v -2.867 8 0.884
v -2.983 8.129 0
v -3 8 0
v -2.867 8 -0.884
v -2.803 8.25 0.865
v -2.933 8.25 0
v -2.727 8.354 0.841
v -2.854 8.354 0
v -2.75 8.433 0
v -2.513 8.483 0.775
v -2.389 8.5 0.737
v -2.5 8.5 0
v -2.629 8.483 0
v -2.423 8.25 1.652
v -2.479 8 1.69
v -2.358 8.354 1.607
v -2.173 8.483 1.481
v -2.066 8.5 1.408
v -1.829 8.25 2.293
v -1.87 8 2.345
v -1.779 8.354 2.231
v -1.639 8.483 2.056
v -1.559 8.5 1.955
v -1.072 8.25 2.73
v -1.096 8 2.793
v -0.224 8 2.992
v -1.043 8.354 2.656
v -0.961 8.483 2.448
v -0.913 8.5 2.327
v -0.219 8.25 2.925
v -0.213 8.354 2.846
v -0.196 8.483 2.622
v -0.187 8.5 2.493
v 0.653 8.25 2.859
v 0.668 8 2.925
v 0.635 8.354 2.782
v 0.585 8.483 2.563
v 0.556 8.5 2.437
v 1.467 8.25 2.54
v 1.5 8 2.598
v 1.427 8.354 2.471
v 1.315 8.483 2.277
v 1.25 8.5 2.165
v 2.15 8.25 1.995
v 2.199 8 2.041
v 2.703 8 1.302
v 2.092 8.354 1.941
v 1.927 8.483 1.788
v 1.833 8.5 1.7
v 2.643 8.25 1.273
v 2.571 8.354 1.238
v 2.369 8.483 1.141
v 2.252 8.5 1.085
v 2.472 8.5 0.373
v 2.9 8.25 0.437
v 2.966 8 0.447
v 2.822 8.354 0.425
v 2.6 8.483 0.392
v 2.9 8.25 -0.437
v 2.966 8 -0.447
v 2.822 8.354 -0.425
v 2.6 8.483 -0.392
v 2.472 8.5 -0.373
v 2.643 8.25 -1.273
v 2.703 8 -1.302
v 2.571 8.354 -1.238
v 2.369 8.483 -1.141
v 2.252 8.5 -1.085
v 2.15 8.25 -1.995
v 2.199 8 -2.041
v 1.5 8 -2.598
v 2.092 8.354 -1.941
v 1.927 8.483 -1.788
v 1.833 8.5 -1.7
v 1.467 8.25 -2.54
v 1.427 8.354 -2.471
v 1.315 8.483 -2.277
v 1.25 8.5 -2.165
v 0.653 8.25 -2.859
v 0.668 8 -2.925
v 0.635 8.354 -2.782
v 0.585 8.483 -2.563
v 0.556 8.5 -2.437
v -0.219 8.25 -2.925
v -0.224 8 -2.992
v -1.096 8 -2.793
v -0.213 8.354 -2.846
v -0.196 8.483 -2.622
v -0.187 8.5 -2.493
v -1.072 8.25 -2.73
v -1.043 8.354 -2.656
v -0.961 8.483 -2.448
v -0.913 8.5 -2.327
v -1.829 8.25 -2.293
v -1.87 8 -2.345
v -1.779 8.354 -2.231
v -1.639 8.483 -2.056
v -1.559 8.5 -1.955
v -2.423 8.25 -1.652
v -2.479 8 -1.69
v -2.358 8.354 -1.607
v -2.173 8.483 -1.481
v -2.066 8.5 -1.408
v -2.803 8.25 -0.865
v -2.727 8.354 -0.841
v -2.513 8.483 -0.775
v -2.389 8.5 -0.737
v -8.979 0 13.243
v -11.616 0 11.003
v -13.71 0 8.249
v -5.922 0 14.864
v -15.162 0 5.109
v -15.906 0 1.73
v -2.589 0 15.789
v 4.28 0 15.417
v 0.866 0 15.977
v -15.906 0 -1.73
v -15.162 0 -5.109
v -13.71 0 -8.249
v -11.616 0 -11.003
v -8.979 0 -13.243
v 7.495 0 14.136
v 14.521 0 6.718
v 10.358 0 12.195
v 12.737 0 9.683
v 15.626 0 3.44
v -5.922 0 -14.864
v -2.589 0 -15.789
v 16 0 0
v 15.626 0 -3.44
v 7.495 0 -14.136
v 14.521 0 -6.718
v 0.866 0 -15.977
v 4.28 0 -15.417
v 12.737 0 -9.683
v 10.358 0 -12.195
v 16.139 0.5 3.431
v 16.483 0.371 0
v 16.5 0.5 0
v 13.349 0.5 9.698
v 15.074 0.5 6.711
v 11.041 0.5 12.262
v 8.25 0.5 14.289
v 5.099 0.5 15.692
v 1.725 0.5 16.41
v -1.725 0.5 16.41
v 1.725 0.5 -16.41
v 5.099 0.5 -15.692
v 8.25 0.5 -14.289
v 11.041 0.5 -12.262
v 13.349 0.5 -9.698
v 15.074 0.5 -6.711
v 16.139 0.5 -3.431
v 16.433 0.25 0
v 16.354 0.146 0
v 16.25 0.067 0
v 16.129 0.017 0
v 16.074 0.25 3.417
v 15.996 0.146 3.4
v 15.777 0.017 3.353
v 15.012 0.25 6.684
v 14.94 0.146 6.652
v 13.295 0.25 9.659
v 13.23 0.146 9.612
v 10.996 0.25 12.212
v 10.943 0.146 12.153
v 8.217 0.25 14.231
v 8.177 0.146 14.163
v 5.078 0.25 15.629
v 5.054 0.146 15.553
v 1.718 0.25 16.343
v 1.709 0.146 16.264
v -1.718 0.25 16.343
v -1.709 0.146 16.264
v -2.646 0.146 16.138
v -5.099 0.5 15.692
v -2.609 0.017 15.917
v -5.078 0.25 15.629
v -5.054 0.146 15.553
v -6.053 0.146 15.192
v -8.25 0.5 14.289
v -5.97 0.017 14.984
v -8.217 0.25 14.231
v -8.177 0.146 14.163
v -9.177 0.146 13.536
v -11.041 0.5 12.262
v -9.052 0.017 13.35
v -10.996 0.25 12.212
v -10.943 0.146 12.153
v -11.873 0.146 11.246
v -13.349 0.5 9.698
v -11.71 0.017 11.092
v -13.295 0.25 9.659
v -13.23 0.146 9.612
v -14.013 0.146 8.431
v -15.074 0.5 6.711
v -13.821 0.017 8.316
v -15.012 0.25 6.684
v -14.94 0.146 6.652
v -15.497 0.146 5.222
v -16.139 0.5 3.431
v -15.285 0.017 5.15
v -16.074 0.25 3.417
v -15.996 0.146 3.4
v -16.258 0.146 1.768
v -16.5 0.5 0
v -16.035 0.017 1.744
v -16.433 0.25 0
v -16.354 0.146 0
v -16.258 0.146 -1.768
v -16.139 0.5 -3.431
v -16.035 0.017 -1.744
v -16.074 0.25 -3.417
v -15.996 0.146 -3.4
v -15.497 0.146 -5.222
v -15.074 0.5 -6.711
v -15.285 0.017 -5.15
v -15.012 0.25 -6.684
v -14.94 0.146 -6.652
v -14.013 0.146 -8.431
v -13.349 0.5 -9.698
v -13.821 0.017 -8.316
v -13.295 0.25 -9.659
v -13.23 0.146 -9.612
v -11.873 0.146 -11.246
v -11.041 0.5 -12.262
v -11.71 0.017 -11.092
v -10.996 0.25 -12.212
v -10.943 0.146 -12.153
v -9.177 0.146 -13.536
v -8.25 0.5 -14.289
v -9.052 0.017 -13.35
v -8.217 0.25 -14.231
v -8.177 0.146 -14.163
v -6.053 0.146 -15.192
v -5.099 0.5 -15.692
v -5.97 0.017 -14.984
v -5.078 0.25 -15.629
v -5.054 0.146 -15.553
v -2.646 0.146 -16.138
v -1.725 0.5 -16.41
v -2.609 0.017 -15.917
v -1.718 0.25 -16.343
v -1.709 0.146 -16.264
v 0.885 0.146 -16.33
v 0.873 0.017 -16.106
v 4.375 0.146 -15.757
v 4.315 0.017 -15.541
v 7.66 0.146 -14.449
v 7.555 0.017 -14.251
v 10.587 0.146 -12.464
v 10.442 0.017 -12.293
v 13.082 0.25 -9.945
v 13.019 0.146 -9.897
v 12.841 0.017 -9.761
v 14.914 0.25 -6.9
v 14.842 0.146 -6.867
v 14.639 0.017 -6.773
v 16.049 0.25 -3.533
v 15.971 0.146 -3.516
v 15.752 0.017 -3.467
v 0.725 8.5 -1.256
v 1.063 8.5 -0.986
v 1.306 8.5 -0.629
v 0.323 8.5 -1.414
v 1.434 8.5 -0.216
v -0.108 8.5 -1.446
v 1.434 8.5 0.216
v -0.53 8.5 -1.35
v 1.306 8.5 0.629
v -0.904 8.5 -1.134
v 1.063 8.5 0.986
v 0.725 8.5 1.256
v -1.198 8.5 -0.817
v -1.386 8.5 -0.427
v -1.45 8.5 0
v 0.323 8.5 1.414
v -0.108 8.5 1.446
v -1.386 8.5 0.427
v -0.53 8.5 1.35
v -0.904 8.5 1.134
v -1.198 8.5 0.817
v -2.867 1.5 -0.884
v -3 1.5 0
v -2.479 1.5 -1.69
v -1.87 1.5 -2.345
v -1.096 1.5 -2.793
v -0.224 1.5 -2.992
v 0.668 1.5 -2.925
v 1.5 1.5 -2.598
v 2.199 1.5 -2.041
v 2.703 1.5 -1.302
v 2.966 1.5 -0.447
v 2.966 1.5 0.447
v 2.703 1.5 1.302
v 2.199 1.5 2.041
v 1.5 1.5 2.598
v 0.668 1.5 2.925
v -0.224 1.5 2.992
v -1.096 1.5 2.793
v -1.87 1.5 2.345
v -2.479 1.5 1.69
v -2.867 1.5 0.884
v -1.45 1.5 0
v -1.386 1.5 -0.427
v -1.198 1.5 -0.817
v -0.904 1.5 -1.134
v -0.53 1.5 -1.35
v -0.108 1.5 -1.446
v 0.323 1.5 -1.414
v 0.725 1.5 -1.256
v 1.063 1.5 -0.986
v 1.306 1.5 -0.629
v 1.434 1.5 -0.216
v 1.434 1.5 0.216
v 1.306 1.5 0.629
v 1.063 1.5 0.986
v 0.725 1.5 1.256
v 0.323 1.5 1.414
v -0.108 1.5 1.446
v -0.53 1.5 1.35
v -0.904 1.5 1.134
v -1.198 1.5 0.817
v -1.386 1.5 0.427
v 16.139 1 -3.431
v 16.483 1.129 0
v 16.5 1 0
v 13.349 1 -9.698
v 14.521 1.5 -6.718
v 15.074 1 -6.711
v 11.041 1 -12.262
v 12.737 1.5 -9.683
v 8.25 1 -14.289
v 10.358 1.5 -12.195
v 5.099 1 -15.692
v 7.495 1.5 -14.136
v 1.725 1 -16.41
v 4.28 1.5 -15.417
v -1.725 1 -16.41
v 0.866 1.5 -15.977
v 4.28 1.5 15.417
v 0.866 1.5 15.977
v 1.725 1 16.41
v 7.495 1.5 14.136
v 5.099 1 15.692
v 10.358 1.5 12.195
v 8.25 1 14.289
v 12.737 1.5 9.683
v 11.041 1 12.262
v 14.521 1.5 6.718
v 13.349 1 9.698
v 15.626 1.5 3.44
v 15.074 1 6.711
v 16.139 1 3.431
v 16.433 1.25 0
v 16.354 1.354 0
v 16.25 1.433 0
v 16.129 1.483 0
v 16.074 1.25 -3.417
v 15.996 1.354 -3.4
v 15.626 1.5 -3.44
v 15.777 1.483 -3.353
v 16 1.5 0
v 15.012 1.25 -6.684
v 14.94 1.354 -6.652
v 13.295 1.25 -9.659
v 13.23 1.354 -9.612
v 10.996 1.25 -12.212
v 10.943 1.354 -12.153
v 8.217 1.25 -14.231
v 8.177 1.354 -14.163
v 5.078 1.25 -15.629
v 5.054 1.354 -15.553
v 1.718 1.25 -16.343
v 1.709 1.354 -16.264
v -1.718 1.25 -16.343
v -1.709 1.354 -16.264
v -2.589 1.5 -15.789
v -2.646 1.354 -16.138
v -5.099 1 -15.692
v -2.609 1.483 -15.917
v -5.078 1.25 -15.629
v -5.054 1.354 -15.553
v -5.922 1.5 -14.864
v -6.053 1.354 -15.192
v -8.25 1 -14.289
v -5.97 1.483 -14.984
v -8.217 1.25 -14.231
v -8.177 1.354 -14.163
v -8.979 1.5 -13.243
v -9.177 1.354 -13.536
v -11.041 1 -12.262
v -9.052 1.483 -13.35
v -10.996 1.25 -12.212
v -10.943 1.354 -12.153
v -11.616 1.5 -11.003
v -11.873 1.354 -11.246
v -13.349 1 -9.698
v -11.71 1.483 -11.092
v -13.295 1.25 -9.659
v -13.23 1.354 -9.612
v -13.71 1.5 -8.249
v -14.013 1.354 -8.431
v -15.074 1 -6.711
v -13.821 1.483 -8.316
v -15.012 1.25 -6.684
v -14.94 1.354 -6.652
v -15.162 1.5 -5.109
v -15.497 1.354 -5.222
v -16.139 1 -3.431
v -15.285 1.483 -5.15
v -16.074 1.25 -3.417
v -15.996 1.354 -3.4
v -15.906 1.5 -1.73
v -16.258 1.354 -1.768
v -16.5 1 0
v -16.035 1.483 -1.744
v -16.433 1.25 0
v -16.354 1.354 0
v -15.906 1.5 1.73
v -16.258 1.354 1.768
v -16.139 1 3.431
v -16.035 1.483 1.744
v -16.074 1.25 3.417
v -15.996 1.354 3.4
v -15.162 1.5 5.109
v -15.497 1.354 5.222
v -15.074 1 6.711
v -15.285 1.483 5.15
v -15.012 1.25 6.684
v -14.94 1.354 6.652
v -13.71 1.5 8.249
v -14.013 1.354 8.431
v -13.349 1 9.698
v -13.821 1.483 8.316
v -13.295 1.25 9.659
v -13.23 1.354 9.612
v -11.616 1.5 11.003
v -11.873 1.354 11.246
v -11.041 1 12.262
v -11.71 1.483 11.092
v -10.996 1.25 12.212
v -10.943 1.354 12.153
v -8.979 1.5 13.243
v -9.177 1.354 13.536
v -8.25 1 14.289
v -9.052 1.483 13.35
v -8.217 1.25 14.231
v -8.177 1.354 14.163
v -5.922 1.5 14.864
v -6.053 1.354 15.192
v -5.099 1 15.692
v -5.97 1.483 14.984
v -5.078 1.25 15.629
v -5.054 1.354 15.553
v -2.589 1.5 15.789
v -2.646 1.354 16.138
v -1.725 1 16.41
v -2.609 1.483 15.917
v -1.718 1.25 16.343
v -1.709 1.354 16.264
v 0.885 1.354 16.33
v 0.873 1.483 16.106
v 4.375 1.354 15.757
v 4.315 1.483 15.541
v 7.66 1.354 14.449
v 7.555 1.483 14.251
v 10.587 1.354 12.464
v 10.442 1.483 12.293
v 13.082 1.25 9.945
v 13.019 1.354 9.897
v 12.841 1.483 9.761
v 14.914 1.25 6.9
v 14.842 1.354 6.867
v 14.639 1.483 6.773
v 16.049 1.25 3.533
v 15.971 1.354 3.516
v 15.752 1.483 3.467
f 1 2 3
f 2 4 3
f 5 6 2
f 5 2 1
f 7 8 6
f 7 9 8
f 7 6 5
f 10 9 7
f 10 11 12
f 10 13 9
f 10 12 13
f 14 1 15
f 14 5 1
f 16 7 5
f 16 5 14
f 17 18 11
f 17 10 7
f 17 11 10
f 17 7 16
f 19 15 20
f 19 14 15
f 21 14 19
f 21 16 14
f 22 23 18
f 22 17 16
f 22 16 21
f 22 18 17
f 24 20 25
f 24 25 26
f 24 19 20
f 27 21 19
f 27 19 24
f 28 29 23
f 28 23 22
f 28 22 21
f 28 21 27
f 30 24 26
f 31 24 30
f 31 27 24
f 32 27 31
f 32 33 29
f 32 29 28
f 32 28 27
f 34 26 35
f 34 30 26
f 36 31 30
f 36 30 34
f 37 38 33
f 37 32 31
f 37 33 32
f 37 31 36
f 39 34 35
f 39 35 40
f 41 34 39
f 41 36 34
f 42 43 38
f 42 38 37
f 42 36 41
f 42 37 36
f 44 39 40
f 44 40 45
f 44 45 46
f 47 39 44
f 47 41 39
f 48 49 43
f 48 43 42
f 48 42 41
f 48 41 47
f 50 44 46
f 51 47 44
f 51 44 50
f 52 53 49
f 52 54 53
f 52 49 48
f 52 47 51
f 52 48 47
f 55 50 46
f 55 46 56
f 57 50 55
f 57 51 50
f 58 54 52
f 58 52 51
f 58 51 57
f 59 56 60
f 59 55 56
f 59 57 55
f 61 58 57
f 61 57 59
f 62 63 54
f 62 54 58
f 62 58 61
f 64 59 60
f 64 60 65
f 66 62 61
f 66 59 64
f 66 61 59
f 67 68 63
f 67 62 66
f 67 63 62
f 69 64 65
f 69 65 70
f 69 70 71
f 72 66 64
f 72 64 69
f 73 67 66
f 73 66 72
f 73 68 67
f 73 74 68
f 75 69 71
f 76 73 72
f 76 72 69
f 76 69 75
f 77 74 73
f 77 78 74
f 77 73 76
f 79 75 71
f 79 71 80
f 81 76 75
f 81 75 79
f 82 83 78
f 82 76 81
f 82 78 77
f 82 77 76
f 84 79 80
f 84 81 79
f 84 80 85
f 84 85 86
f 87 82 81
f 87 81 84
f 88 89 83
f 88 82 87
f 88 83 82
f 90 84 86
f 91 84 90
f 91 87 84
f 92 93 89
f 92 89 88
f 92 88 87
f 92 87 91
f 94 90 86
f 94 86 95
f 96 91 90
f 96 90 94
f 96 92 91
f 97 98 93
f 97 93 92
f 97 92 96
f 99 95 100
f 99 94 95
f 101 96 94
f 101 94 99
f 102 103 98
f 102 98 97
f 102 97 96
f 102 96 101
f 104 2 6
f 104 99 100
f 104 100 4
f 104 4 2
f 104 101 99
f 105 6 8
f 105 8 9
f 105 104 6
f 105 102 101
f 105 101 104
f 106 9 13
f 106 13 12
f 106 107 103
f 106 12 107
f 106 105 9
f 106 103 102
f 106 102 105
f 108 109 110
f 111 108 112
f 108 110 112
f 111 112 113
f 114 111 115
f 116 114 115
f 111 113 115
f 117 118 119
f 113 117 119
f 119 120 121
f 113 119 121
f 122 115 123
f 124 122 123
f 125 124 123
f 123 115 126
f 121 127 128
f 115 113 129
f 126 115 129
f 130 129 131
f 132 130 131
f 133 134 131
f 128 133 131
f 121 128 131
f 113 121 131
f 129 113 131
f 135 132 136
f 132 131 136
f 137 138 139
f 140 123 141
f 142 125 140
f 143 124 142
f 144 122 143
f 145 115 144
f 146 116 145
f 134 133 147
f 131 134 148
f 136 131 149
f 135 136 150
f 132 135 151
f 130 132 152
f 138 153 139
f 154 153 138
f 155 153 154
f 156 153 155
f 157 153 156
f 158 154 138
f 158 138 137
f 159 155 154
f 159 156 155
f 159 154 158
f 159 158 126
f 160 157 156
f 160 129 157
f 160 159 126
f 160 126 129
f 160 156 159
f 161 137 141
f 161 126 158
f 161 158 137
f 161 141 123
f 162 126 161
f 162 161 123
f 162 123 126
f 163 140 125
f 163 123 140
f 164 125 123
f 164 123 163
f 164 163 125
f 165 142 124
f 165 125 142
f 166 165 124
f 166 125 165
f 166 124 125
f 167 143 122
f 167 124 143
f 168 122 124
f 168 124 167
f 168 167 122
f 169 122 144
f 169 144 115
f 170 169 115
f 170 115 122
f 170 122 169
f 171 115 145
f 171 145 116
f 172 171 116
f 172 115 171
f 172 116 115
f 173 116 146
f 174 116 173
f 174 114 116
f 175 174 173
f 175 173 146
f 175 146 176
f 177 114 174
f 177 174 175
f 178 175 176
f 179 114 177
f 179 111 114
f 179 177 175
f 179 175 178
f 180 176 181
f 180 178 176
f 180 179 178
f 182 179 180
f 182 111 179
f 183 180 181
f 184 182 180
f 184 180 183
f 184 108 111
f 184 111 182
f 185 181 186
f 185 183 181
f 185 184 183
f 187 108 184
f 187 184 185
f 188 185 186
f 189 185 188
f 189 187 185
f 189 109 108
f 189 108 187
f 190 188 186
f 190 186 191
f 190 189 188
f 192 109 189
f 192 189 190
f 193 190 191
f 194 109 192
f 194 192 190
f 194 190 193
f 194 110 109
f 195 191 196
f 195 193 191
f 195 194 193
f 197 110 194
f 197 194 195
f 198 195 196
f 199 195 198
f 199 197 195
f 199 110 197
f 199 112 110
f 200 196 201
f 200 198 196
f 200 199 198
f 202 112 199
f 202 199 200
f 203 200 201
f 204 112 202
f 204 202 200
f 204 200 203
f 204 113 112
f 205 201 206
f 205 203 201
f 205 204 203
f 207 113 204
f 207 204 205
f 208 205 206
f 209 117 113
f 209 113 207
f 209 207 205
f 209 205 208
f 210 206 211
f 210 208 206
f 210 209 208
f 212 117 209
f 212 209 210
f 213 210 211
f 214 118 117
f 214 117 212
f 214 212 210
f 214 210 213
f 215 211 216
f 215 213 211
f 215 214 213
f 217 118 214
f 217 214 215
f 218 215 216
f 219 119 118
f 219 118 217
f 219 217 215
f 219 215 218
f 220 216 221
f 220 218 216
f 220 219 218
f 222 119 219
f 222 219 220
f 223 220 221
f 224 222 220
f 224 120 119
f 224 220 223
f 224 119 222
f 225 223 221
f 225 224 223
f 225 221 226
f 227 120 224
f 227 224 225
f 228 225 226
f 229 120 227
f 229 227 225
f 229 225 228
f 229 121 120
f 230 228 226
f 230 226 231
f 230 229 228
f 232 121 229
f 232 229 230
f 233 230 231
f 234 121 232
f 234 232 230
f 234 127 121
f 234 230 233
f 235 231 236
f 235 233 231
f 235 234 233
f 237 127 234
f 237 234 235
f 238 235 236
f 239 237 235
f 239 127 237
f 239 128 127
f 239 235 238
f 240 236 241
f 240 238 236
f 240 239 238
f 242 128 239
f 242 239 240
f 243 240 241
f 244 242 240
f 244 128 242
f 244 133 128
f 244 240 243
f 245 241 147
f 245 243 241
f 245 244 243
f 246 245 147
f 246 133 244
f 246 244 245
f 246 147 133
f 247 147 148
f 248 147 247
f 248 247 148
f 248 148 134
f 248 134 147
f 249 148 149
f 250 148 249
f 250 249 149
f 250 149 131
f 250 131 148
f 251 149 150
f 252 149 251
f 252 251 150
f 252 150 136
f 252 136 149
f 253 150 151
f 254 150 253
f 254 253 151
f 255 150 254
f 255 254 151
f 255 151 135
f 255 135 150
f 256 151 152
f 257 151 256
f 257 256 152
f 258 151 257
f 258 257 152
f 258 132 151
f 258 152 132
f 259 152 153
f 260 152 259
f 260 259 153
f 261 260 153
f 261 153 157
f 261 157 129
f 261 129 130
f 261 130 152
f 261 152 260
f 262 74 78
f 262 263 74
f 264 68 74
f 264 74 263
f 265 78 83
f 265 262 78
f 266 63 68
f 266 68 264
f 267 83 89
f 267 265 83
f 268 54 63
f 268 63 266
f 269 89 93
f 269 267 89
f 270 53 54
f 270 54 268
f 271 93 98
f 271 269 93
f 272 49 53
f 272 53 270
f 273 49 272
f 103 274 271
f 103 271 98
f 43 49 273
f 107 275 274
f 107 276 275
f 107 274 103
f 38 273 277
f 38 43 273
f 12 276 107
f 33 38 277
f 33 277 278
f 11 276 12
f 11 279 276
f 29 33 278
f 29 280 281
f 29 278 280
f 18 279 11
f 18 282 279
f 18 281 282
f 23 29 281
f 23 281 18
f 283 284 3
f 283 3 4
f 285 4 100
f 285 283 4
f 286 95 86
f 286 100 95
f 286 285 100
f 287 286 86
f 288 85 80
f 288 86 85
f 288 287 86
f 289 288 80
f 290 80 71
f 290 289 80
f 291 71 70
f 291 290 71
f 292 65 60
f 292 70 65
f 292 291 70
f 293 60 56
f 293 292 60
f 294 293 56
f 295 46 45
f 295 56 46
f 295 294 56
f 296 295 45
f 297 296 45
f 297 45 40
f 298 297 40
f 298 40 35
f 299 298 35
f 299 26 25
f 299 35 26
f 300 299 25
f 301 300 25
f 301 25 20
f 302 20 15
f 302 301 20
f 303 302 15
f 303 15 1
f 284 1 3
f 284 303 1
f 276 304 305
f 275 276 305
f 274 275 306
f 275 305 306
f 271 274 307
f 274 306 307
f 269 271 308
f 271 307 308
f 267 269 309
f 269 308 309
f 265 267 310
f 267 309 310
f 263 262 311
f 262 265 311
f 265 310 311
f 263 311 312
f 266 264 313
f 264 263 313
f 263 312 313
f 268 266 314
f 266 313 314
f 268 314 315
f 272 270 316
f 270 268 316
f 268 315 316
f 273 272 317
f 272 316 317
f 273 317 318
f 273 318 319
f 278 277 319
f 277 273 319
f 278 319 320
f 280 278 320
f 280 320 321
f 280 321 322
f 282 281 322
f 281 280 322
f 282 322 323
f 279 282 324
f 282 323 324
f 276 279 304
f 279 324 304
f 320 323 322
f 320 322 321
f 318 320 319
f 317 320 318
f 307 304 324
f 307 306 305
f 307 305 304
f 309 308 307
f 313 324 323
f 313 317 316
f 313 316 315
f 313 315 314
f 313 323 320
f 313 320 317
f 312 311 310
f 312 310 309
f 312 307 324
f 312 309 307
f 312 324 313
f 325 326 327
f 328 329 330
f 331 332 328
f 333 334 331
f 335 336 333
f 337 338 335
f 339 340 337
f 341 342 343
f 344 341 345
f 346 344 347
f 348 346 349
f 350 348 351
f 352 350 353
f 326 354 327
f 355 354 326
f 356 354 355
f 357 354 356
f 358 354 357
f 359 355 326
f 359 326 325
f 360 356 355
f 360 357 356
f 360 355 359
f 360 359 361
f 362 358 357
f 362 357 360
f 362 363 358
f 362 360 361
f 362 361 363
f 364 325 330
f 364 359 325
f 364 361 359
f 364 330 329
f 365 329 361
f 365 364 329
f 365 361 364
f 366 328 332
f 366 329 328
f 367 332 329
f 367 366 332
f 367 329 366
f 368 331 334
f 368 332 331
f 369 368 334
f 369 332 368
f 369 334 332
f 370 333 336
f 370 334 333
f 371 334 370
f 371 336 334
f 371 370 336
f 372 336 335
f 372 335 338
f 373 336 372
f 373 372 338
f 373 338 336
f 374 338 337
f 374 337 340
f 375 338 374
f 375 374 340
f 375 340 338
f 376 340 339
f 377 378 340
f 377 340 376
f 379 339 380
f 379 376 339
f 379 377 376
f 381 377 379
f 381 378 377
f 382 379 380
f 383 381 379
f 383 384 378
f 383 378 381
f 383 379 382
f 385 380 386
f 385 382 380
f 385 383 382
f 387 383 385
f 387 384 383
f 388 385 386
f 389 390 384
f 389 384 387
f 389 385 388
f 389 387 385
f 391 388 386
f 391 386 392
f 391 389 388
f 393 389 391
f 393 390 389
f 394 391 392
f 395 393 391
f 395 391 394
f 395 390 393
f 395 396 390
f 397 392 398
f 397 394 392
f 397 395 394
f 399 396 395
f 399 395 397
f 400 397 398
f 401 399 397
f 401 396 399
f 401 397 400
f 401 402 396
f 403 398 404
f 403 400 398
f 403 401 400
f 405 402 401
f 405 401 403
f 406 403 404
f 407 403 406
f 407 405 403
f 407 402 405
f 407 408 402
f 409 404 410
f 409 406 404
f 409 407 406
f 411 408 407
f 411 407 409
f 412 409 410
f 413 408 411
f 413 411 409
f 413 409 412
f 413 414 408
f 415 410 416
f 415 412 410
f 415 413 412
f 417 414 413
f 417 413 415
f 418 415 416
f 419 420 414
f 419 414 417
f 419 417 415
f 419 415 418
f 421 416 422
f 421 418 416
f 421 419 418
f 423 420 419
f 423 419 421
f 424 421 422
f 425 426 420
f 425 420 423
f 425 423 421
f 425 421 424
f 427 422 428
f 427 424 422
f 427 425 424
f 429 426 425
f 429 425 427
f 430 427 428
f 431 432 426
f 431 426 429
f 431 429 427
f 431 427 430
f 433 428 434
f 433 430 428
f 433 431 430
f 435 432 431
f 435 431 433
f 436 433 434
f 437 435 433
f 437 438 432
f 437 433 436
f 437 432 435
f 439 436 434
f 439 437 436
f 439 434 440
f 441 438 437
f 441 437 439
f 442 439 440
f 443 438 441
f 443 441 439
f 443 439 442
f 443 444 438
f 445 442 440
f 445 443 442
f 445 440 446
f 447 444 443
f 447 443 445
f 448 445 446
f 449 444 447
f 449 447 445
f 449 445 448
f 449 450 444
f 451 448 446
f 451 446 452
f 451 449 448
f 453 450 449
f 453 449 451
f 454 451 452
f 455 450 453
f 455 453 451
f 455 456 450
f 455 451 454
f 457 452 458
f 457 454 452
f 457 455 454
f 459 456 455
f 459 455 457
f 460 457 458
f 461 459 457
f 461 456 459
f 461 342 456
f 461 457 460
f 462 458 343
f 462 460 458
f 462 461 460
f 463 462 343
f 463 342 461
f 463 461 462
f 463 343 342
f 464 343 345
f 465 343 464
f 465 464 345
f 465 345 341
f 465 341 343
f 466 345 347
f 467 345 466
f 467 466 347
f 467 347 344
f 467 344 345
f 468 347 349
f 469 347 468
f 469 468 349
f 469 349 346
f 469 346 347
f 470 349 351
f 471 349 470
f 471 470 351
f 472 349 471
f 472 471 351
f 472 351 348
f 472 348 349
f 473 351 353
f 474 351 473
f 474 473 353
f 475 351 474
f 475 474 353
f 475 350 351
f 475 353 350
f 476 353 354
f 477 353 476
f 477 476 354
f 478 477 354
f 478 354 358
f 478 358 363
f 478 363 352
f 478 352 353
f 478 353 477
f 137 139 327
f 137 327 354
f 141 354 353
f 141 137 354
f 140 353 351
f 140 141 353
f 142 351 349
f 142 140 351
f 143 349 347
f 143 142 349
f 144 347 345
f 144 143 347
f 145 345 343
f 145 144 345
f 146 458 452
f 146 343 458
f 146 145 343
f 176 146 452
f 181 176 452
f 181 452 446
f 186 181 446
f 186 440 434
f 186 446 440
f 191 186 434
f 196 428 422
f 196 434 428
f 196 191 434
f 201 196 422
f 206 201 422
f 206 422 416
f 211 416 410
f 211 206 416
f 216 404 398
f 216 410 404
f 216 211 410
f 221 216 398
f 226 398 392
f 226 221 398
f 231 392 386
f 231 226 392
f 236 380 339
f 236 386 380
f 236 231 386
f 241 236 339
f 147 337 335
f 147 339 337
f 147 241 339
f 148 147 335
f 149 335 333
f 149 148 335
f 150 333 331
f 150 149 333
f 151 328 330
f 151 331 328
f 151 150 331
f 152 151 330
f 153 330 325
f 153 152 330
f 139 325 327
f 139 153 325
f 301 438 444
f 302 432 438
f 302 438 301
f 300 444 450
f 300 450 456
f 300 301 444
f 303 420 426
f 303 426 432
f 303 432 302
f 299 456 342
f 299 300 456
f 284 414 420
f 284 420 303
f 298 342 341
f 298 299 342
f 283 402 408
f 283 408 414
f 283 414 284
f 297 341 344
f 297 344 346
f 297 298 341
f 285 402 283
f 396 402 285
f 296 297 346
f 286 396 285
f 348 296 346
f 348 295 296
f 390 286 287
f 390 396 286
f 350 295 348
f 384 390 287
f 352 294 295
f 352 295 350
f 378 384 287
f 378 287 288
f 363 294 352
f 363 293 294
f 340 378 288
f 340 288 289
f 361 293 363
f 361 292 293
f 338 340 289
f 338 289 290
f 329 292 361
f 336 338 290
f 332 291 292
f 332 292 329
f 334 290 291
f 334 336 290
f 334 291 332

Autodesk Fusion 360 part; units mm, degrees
sketch "Sketch1" plane through (0, 0, 0) normal (0, 1, 0) x (1, 0, 0)
  circle A0 centre (0, 0) radius 16.5
  dimension "d1" = 33
extrude "Extrude1" add sketch "Sketch1" along normal blind 1.5
sketch "Sketch2" plane through (0, 1.5, 0) normal (0, 1, 0) x (-1, 0, 0)
  circle A0 centre (0, 0) radius 16.5
  circle A1 centre (0, 0) radius 3
  circle A2 centre (0, 0) radius 1.45
  dimension "d4" = 6
  dimension "d5" = 2.9
extrude "Extrude2" add sketch "Sketch2" along normal blind 7 contours A1
fillet "Fillet1" radius 0.5 3 edges at (-15.3834, 0, 5.9667) (-15.3834, 1.5, 5.9667) (2.797, 8.5, -1.0848)
